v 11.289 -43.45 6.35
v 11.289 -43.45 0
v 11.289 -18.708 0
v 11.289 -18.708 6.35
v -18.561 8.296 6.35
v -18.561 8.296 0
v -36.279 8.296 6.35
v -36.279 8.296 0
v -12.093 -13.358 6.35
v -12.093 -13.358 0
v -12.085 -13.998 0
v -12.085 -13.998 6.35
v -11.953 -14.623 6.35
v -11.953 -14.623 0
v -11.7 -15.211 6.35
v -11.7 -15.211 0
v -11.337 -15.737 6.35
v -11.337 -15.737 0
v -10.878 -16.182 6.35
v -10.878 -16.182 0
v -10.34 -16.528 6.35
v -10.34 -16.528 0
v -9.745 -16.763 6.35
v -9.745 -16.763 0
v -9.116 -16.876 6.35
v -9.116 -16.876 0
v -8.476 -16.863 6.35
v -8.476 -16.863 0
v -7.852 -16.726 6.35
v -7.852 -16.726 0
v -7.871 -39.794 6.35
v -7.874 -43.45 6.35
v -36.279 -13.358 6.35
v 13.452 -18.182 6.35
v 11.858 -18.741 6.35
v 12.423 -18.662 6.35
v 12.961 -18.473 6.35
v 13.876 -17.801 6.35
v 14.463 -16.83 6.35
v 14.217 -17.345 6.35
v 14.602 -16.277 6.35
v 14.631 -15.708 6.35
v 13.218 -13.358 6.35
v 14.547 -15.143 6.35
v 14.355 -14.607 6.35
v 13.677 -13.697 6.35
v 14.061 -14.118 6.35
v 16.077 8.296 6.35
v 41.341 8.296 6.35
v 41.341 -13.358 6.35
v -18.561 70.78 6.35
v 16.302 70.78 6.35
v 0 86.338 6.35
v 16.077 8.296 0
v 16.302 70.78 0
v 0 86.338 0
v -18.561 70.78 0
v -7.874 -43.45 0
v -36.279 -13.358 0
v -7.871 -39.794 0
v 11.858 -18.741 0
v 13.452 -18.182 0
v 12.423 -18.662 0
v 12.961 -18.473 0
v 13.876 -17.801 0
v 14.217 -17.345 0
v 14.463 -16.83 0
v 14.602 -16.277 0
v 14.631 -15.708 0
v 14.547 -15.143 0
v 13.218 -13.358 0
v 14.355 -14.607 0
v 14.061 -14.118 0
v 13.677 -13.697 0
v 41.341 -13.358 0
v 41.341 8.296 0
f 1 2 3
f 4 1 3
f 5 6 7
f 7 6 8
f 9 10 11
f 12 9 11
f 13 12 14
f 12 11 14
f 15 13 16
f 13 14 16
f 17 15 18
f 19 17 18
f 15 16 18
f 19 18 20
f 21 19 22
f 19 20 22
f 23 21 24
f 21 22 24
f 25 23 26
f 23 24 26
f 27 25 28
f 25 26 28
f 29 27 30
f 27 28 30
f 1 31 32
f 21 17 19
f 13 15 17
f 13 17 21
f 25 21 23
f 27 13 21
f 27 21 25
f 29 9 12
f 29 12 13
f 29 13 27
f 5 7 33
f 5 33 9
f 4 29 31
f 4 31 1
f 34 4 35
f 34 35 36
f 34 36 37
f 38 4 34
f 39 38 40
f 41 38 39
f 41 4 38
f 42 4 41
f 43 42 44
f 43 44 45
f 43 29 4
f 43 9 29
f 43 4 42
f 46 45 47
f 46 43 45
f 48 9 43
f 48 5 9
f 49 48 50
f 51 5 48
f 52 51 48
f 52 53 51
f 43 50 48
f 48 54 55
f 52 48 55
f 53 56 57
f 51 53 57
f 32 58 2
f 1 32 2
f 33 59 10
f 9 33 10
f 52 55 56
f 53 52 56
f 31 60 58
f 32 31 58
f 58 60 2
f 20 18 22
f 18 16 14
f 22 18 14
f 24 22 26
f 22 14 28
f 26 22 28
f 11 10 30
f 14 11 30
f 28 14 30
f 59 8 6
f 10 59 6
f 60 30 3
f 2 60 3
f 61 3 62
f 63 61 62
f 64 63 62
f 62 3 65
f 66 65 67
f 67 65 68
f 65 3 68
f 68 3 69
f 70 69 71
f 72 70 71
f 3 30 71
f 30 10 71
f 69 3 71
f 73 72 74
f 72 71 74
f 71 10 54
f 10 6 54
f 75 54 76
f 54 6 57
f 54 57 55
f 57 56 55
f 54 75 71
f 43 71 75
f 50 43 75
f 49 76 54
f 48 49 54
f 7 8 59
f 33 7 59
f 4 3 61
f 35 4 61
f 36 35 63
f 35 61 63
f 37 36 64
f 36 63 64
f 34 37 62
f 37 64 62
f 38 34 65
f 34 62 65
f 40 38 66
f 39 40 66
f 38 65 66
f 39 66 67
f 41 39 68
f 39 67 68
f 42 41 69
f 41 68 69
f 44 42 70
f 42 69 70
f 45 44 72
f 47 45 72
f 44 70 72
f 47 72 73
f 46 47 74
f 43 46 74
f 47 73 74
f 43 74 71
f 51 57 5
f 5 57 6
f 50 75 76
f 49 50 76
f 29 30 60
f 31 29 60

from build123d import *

# Parameters (mm, degrees)
F1_DEPTH = 6.35


with BuildPart() as f1:
    # F0 (on Top) → F1 (new body)
    with BuildSketch(Plane.XY):
        with BuildLine():
            Line((11.2930470291, 11.6638336243), (11.2889658673, 8.2962913439))
            Line((11.2889658673, 8.2962913439), (12.0783096254, 8.2962913439))
            ThreePointArc((12.0783096254, 8.2962913439), (11.597122228, 9.9594124709), (11.2930470291, 11.6638336243))
        make_face()
        with BuildLine():
            ThreePointArc((37.3601643932, 8.2962913439), (38.2870822741, 3.6378996321), (41.3408465683, 0))
            Line((41.3408465683, 0), (41.3408465683, 8.2962913439))
            Line((41.3408465683, 8.2962913439), (37.3601643932, 8.2962913439))
        make_face()
        Polygon((-2.8123026714, 44.2937612534), (-2.8123026714, 8.2962913439), (4.7809146345, 8.2962913439), (4.2298541355, 62.0834718136), (0, 65.1047974825), (-2.8123026714, 61.1675754189), (-2.8123026714, 51.8869794905), align=None)
        with BuildLine():
            Line((-10.813491419, 44.2937612534), (-10.8399443516, 12.7670755447))
            ThreePointArc((-10.8399443516, 12.7670755447), (-7.807634986, 11.5598221537), (-7.8491980914, 8.2962913439))
            Line((-7.8491980914, 8.2962913439), (-2.8123026714, 8.2962913439))
            Line((-2.8123026714, 8.2962913439), (-2.8123026714, 44.2937612534))
            Line((-2.8123026714, 44.2937612534), (-2.8123026714, 51.8869794905))
            Line((-2.8123026714, 51.8869794905), (-2.8123026714, 61.1675754189))
            Line((-2.8123026714, 61.1675754189), (0, 65.1047974825))
            Line((0, 65.1047974825), (4.2298541355, 62.0834718136))
            Line((4.2298541355, 62.0834718136), (4.7809146345, 8.2962913439))
            Line((4.7809146345, 8.2962913439), (7.9583702463, 8.2962913439))
            ThreePointArc((7.9583702463, 8.2962913439), (8.7402628967, 10.8568667256), (11.2930470291, 11.6638336243))
            Line((11.2930470291, 11.6638336243), (11.3227786668, 36.1966877298))
            Line((11.3227786668, 36.1966877298), (11.3565914662, 64.0970841157))
            Line((11.3565914662, 64.0970841157), (0, 76.3540118933))
            Line((0, 76.3540118933), (-10.813491419, 66.3348287344))
            Line((-10.813491419, 66.3348287344), (-10.813491419, 44.2937612534))
        make_face()
        with BuildLine():
            Line((-7.8520236744, -16.7259749874), (-7.8491980914, -13.3584365249))
            Line((-7.8491980914, -13.3584365249), (-12.0928995311, -13.3584365249))
            ThreePointArc((-12.0928995311, -13.3584365249), (-10.8775211038, -16.1819833799), (-7.8520236744, -16.7259749874))
        make_face()
        with BuildLine():
            ThreePointArc((11.2889658673, -38.08565063), (8.4977328176, -40.3265486279), (6.7495256662, -43.4500686824))
            Line((6.7495256662, -43.4500686824), (11.2889658673, -43.4500686824))
            Line((11.2889658673, -43.4500686824), (11.2889658673, -38.08565063))
        make_face()
        with BuildLine():
            Line((11.2889658673, -13.3584365249), (11.2889658673, -18.7083456713))
            ThreePointArc((11.2889658673, -18.7083456713), (14.4627701422, -16.8299590512), (13.2178198546, -13.3584365249))
            Line((13.2178198546, -13.3584365249), (11.2889658673, -13.3584365249))
        make_face()
        with BuildLine():
            ThreePointArc((41.3408465683, -8.0150617286), (38.6442879923, -10.0493741157), (37.9660837352, -13.3584365249))
            Line((37.9660837352, -13.3584365249), (41.3408465683, -13.3584365249))
            Line((41.3408465683, -13.3584365249), (41.3408465683, -8.0150617286))
        make_face()
        with BuildLine():
            Line((-10.8399443516, 12.7670755447), (-10.8436956293, 8.2962913439))
            Line((-10.8436956293, 8.2962913439), (-10.813491419, 8.2962913439))
            Line((-10.813491419, 8.2962913439), (-7.8491980914, 8.2962913439))
            ThreePointArc((-7.8491980914, 8.2962913439), (-7.807634986, 11.5598221537), (-10.8399443516, 12.7670755447))
        make_face()
        with BuildLine():
            ThreePointArc((-5.6246044114, -43.4500686824), (-5.6592907147, -40.9529633104), (-7.8713791675, -39.793910656))
            Line((-7.8713791675, -39.793910656), (-7.8744469211, -43.4500686824))
            Line((-7.8744469211, -43.4500686824), (-5.6246044114, -43.4500686824))
        make_face()
        with BuildLine():
            ThreePointArc((11.2930470291, 11.6638336243), (8.7402628967, 10.8568667256), (7.9583702463, 8.2962913439))
            Line((7.9583702463, 8.2962913439), (11.2889658673, 8.2962913439))
            Line((11.2889658673, 8.2962913439), (11.2930470291, 11.6638336243))
        make_face()
        with BuildLine():
            Line((-12.0928995311, -13.3584365249), (-7.8491980914, -13.3584365249))
            Line((-7.8491980914, -13.3584365249), (-7.8520236744, -16.7259749874))
            Line((-7.8520236744, -16.7259749874), (-7.8713791675, -39.793910656))
            ThreePointArc((-7.8713791675, -39.793910656), (-5.6592907147, -40.9529633104), (-5.6246044114, -43.4500686824))
            Line((-5.6246044114, -43.4500686824), (6.7495256662, -43.4500686824))
            ThreePointArc((6.7495256662, -43.4500686824), (8.4977328176, -40.3265486279), (11.2889658673, -38.08565063))
            Line((11.2889658673, -38.08565063), (11.2889658673, -18.7083456713))
            Line((11.2889658673, -18.7083456713), (11.2889658673, -13.3584365249))
            Line((11.2889658673, -13.3584365249), (13.2178198546, -13.3584365249))
            Line((13.2178198546, -13.3584365249), (37.9660837352, -13.3584365249))
            ThreePointArc((37.9660837352, -13.3584365249), (38.6442879923, -10.0493741157), (41.3408465683, -8.0150617286))
            Line((41.3408465683, -8.0150617286), (41.3408465683, 0))
            ThreePointArc((41.3408465683, 0), (38.2870822741, 3.6378996321), (37.3601643932, 8.2962913439))
            Line((37.3601643932, 8.2962913439), (31.7790135741, 8.2962913439))
            Line((31.7790135741, 8.2962913439), (17.8106164583, 8.2962913439))
            Line((17.8106164583, 8.2962913439), (16.0766797152, 8.2962913439))
            Line((16.0766797152, 8.2962913439), (14.3427429721, 8.2962913439))
            Line((14.3427429721, 8.2962913439), (12.0783096254, 8.2962913439))
            Line((12.0783096254, 8.2962913439), (11.2889658673, 8.2962913439))
            Line((11.2889658673, 8.2962913439), (7.9583702463, 8.2962913439))
            Line((7.9583702463, 8.2962913439), (4.7809146345, 8.2962913439))
            Line((4.7809146345, 8.2962913439), (-2.8123026714, 8.2962913439))
            Line((-2.8123026714, 8.2962913439), (-7.8491980914, 8.2962913439))
            Line((-7.8491980914, 8.2962913439), (-10.813491419, 8.2962913439))
            Line((-10.813491419, 8.2962913439), (-10.8436956293, 8.2962913439))
            Line((-10.8436956293, 8.2962913439), (-18.5611955822, 8.2962913439))
            Line((-18.5611955822, 8.2962913439), (-27.1387170069, 8.2962913439))
            Line((-27.1387170069, 8.2962913439), (-31.7087078001, 8.2962913439))
            ThreePointArc((-31.7087078001, 8.2962913439), (-32.9074253056, 5.0668217141), (-36.2786985934, 4.3590688147))
            Line((-36.2786985934, 4.3590688147), (-36.2786985934, -8.5775218904))
            ThreePointArc((-36.2786985934, -8.5775218904), (-33.5801197144, -10.4479621169), (-32.0602469146, -13.3584365249))
            Line((-32.0602469146, -13.3584365249), (-12.0928995311, -13.3584365249))
        make_face()
        with BuildLine():
            Line((-18.5611955822, 15.7010573894), (-18.5611955822, 8.2962913439))
            Line((-18.5611955822, 8.2962913439), (-10.8436956293, 8.2962913439))
            Line((-10.8436956293, 8.2962913439), (-10.8399443516, 12.7670755447))
            Line((-10.8399443516, 12.7670755447), (-10.813491419, 44.2937612534))
            Line((-10.813491419, 44.2937612534), (-10.813491419, 66.3348287344))
            Line((-10.813491419, 66.3348287344), (0, 76.3540118933))
            Line((0, 76.3540118933), (11.3565914662, 64.0970841157))
            Line((11.3565914662, 64.0970841157), (11.3227786668, 36.1966877298))
            Line((11.3227786668, 36.1966877298), (11.2930470291, 11.6638336243))
            ThreePointArc((11.2930470291, 11.6638336243), (11.597122228, 9.9594124709), (12.0783096254, 8.2962913439))
            Line((12.0783096254, 8.2962913439), (14.3427429721, 8.2962913439))
            Line((14.3427429721, 8.2962913439), (16.0766797152, 8.2962913439))
            Line((16.0766797152, 8.2962913439), (16.3020100445, 70.7799866796))
            Line((16.3020100445, 70.7799866796), (0, 86.3380655646))
            Line((0, 86.3380655646), (-18.5611955822, 70.7799866796))
            Line((-18.5611955822, 70.7799866796), (-18.5611955822, 15.7010573894))
        make_face()
        with BuildLine():
            Line((-36.2786985934, 8.2962913439), (-36.2786985934, 4.3590688147))
            ThreePointArc((-36.2786985934, 4.3590688147), (-32.9074253056, 5.0668217141), (-31.7087078001, 8.2962913439))
            Line((-31.7087078001, 8.2962913439), (-36.2786985934, 8.2962913439))
        make_face()
        with BuildLine():
            Line((-36.2786985934, -13.3584365249), (-32.0602469146, -13.3584365249))
            ThreePointArc((-32.0602469146, -13.3584365249), (-33.5801197144, -10.4479621169), (-36.2786985934, -8.5775218904))
            Line((-36.2786985934, -8.5775218904), (-36.2786985934, -13.3584365249))
        make_face()
    extrude(amount=F1_DEPTH)


solid = f1.part
